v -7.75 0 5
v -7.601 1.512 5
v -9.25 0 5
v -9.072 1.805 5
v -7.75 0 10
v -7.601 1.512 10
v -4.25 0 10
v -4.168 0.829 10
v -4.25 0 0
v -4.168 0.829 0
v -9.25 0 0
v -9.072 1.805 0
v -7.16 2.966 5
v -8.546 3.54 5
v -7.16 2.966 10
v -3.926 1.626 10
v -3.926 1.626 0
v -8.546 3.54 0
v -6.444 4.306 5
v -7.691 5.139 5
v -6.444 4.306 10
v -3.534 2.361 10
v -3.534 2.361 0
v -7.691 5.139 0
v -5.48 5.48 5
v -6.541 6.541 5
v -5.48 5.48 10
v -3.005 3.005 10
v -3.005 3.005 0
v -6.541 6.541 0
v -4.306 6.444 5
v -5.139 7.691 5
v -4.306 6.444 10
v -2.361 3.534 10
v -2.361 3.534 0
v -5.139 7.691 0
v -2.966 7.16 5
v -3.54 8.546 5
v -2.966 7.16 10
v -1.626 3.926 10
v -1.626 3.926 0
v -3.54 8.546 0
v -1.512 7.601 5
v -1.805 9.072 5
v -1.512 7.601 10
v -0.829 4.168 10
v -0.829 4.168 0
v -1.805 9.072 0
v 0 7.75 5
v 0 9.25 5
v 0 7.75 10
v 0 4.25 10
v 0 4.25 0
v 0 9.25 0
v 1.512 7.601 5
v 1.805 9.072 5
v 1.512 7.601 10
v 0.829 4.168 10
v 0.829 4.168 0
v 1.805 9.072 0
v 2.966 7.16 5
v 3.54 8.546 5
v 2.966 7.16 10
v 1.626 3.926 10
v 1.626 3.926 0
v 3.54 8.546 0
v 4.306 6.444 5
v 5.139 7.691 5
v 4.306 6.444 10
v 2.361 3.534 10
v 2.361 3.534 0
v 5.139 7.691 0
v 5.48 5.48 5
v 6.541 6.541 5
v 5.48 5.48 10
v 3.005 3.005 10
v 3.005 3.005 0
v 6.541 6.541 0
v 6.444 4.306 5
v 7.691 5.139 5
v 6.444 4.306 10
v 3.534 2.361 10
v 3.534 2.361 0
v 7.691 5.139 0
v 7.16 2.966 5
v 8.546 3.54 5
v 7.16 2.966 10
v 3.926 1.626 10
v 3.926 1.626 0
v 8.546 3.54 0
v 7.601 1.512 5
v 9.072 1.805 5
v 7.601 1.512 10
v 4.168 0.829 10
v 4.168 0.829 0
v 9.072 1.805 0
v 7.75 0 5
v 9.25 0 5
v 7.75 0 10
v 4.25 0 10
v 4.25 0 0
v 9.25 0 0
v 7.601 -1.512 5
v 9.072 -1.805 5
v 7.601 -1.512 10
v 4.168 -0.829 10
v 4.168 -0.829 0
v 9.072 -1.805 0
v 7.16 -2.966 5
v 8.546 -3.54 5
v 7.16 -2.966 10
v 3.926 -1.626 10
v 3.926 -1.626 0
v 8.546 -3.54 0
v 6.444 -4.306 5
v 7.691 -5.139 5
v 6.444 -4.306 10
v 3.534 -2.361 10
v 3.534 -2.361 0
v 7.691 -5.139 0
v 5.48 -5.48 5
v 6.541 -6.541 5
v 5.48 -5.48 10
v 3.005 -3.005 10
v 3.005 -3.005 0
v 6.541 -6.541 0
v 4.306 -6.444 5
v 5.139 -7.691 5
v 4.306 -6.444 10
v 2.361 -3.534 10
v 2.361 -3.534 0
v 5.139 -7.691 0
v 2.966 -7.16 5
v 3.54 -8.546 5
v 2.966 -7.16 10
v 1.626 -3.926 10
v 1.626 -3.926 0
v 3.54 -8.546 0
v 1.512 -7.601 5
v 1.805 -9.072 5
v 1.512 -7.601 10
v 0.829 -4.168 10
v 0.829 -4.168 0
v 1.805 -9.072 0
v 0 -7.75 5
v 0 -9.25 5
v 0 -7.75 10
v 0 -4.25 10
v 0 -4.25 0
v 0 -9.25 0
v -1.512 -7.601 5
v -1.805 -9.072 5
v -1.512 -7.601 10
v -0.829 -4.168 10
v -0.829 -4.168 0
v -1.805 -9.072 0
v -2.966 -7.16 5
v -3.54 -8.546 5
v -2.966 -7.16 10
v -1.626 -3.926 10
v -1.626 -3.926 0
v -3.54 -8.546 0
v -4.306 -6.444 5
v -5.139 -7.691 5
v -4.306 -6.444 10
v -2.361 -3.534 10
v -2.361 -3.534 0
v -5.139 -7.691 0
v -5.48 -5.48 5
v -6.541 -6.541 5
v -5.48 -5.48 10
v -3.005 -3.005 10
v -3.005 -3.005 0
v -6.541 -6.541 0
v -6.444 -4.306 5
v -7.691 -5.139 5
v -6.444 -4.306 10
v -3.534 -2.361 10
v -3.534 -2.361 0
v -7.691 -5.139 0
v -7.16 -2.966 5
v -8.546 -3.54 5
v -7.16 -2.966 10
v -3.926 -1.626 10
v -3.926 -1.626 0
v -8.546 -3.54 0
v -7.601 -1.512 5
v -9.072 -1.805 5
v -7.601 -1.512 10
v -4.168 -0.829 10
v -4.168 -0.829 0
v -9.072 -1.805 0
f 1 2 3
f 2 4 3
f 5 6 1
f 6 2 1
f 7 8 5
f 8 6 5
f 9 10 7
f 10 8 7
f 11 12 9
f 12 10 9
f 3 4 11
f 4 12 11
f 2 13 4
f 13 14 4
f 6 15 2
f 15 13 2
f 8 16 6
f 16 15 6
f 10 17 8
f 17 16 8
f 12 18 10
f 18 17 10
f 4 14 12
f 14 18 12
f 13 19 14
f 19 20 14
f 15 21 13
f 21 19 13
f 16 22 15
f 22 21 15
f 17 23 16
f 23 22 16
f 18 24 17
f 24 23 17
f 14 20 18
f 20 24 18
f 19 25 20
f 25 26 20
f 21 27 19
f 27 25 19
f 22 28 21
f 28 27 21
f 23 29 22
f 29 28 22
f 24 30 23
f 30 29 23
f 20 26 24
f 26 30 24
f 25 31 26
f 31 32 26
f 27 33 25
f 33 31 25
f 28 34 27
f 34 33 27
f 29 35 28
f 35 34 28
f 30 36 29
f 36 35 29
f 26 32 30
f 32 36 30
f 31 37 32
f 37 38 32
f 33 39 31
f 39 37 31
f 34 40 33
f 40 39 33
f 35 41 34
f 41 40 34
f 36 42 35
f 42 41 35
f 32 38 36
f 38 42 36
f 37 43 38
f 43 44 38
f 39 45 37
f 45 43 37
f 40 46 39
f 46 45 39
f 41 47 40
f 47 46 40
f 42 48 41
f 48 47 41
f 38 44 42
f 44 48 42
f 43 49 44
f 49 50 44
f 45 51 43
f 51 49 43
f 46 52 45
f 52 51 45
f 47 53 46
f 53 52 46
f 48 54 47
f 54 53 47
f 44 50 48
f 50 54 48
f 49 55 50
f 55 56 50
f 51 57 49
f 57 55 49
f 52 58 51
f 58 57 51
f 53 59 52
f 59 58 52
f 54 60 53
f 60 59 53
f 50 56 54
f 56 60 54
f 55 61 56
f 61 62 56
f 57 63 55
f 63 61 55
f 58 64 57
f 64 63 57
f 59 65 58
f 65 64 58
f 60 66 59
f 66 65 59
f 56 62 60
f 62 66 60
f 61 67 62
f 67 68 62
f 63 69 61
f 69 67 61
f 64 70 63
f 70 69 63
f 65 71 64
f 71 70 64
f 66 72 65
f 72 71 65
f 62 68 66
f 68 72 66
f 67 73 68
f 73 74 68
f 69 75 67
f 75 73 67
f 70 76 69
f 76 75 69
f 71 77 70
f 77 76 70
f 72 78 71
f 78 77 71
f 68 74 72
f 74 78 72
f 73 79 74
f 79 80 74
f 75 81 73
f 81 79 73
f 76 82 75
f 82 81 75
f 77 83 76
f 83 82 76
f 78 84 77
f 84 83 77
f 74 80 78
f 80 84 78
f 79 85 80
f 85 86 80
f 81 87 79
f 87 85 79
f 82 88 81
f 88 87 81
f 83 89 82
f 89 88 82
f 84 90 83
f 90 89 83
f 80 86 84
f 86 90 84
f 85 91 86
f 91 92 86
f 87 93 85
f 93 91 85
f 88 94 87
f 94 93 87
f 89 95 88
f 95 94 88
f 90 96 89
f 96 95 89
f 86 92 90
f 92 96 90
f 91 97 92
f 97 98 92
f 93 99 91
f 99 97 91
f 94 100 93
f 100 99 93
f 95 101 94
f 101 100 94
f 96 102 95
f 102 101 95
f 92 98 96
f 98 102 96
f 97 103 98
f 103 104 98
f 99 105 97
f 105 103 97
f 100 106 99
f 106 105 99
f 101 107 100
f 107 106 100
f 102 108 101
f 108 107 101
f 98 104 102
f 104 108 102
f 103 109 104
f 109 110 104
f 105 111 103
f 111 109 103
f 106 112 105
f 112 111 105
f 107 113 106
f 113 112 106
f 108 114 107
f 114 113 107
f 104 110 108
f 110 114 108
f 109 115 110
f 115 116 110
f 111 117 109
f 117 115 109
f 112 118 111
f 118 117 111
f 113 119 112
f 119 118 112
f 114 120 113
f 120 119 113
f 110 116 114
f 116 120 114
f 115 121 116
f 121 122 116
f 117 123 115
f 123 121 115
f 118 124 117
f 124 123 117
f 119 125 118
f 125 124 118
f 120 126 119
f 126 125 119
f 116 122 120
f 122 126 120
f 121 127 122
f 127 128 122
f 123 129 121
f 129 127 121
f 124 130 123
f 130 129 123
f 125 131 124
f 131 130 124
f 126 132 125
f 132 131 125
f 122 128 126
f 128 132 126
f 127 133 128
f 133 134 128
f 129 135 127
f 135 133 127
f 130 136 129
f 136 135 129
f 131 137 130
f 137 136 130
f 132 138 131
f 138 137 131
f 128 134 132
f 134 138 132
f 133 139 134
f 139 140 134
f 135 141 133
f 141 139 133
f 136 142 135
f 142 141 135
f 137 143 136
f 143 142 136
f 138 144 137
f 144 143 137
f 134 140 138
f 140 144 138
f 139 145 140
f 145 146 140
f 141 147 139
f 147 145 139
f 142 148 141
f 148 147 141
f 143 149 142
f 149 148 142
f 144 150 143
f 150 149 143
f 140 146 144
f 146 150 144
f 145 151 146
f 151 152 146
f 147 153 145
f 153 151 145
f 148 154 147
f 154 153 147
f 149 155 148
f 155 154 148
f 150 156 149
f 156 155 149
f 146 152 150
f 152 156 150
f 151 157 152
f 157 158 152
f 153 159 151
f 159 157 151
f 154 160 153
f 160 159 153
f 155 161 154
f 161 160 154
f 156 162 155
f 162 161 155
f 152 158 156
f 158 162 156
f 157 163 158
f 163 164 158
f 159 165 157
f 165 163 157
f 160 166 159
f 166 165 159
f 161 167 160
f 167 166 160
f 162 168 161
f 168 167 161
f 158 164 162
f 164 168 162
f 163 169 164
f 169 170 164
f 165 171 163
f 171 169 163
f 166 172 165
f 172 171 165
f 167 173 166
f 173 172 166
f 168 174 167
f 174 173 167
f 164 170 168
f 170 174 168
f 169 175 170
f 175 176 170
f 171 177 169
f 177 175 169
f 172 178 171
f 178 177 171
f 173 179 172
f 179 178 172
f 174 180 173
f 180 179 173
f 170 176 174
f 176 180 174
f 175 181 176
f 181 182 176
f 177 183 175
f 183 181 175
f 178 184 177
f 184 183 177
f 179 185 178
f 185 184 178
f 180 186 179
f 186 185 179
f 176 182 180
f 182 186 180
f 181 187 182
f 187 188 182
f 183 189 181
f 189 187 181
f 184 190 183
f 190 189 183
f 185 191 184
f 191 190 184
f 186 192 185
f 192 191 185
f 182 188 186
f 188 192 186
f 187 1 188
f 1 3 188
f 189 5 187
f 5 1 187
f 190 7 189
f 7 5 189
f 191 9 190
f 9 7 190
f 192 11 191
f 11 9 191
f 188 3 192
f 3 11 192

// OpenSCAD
$fn = 32;

// ----------------------------------------------------------------------
// Form washer: stepped_c washer, 18.5 mm outside, 8.5 mm bore
// ----------------------------------------------------------------------

// --- parameters (mm) ---
revolve_angle = 360;      // full turn around the Z axis
profile_points = 6;       // points of the closed outline

profile = [[4.25, 0], [9.25, 0], [9.25, 5], [7.75, 5], [7.75, 10], [4.25, 10]];  // single closed polygon, 6 points, counter clockwise

// --- the one profile operation ---
rotate_extrude(angle = revolve_angle) polygon(points = profile);
